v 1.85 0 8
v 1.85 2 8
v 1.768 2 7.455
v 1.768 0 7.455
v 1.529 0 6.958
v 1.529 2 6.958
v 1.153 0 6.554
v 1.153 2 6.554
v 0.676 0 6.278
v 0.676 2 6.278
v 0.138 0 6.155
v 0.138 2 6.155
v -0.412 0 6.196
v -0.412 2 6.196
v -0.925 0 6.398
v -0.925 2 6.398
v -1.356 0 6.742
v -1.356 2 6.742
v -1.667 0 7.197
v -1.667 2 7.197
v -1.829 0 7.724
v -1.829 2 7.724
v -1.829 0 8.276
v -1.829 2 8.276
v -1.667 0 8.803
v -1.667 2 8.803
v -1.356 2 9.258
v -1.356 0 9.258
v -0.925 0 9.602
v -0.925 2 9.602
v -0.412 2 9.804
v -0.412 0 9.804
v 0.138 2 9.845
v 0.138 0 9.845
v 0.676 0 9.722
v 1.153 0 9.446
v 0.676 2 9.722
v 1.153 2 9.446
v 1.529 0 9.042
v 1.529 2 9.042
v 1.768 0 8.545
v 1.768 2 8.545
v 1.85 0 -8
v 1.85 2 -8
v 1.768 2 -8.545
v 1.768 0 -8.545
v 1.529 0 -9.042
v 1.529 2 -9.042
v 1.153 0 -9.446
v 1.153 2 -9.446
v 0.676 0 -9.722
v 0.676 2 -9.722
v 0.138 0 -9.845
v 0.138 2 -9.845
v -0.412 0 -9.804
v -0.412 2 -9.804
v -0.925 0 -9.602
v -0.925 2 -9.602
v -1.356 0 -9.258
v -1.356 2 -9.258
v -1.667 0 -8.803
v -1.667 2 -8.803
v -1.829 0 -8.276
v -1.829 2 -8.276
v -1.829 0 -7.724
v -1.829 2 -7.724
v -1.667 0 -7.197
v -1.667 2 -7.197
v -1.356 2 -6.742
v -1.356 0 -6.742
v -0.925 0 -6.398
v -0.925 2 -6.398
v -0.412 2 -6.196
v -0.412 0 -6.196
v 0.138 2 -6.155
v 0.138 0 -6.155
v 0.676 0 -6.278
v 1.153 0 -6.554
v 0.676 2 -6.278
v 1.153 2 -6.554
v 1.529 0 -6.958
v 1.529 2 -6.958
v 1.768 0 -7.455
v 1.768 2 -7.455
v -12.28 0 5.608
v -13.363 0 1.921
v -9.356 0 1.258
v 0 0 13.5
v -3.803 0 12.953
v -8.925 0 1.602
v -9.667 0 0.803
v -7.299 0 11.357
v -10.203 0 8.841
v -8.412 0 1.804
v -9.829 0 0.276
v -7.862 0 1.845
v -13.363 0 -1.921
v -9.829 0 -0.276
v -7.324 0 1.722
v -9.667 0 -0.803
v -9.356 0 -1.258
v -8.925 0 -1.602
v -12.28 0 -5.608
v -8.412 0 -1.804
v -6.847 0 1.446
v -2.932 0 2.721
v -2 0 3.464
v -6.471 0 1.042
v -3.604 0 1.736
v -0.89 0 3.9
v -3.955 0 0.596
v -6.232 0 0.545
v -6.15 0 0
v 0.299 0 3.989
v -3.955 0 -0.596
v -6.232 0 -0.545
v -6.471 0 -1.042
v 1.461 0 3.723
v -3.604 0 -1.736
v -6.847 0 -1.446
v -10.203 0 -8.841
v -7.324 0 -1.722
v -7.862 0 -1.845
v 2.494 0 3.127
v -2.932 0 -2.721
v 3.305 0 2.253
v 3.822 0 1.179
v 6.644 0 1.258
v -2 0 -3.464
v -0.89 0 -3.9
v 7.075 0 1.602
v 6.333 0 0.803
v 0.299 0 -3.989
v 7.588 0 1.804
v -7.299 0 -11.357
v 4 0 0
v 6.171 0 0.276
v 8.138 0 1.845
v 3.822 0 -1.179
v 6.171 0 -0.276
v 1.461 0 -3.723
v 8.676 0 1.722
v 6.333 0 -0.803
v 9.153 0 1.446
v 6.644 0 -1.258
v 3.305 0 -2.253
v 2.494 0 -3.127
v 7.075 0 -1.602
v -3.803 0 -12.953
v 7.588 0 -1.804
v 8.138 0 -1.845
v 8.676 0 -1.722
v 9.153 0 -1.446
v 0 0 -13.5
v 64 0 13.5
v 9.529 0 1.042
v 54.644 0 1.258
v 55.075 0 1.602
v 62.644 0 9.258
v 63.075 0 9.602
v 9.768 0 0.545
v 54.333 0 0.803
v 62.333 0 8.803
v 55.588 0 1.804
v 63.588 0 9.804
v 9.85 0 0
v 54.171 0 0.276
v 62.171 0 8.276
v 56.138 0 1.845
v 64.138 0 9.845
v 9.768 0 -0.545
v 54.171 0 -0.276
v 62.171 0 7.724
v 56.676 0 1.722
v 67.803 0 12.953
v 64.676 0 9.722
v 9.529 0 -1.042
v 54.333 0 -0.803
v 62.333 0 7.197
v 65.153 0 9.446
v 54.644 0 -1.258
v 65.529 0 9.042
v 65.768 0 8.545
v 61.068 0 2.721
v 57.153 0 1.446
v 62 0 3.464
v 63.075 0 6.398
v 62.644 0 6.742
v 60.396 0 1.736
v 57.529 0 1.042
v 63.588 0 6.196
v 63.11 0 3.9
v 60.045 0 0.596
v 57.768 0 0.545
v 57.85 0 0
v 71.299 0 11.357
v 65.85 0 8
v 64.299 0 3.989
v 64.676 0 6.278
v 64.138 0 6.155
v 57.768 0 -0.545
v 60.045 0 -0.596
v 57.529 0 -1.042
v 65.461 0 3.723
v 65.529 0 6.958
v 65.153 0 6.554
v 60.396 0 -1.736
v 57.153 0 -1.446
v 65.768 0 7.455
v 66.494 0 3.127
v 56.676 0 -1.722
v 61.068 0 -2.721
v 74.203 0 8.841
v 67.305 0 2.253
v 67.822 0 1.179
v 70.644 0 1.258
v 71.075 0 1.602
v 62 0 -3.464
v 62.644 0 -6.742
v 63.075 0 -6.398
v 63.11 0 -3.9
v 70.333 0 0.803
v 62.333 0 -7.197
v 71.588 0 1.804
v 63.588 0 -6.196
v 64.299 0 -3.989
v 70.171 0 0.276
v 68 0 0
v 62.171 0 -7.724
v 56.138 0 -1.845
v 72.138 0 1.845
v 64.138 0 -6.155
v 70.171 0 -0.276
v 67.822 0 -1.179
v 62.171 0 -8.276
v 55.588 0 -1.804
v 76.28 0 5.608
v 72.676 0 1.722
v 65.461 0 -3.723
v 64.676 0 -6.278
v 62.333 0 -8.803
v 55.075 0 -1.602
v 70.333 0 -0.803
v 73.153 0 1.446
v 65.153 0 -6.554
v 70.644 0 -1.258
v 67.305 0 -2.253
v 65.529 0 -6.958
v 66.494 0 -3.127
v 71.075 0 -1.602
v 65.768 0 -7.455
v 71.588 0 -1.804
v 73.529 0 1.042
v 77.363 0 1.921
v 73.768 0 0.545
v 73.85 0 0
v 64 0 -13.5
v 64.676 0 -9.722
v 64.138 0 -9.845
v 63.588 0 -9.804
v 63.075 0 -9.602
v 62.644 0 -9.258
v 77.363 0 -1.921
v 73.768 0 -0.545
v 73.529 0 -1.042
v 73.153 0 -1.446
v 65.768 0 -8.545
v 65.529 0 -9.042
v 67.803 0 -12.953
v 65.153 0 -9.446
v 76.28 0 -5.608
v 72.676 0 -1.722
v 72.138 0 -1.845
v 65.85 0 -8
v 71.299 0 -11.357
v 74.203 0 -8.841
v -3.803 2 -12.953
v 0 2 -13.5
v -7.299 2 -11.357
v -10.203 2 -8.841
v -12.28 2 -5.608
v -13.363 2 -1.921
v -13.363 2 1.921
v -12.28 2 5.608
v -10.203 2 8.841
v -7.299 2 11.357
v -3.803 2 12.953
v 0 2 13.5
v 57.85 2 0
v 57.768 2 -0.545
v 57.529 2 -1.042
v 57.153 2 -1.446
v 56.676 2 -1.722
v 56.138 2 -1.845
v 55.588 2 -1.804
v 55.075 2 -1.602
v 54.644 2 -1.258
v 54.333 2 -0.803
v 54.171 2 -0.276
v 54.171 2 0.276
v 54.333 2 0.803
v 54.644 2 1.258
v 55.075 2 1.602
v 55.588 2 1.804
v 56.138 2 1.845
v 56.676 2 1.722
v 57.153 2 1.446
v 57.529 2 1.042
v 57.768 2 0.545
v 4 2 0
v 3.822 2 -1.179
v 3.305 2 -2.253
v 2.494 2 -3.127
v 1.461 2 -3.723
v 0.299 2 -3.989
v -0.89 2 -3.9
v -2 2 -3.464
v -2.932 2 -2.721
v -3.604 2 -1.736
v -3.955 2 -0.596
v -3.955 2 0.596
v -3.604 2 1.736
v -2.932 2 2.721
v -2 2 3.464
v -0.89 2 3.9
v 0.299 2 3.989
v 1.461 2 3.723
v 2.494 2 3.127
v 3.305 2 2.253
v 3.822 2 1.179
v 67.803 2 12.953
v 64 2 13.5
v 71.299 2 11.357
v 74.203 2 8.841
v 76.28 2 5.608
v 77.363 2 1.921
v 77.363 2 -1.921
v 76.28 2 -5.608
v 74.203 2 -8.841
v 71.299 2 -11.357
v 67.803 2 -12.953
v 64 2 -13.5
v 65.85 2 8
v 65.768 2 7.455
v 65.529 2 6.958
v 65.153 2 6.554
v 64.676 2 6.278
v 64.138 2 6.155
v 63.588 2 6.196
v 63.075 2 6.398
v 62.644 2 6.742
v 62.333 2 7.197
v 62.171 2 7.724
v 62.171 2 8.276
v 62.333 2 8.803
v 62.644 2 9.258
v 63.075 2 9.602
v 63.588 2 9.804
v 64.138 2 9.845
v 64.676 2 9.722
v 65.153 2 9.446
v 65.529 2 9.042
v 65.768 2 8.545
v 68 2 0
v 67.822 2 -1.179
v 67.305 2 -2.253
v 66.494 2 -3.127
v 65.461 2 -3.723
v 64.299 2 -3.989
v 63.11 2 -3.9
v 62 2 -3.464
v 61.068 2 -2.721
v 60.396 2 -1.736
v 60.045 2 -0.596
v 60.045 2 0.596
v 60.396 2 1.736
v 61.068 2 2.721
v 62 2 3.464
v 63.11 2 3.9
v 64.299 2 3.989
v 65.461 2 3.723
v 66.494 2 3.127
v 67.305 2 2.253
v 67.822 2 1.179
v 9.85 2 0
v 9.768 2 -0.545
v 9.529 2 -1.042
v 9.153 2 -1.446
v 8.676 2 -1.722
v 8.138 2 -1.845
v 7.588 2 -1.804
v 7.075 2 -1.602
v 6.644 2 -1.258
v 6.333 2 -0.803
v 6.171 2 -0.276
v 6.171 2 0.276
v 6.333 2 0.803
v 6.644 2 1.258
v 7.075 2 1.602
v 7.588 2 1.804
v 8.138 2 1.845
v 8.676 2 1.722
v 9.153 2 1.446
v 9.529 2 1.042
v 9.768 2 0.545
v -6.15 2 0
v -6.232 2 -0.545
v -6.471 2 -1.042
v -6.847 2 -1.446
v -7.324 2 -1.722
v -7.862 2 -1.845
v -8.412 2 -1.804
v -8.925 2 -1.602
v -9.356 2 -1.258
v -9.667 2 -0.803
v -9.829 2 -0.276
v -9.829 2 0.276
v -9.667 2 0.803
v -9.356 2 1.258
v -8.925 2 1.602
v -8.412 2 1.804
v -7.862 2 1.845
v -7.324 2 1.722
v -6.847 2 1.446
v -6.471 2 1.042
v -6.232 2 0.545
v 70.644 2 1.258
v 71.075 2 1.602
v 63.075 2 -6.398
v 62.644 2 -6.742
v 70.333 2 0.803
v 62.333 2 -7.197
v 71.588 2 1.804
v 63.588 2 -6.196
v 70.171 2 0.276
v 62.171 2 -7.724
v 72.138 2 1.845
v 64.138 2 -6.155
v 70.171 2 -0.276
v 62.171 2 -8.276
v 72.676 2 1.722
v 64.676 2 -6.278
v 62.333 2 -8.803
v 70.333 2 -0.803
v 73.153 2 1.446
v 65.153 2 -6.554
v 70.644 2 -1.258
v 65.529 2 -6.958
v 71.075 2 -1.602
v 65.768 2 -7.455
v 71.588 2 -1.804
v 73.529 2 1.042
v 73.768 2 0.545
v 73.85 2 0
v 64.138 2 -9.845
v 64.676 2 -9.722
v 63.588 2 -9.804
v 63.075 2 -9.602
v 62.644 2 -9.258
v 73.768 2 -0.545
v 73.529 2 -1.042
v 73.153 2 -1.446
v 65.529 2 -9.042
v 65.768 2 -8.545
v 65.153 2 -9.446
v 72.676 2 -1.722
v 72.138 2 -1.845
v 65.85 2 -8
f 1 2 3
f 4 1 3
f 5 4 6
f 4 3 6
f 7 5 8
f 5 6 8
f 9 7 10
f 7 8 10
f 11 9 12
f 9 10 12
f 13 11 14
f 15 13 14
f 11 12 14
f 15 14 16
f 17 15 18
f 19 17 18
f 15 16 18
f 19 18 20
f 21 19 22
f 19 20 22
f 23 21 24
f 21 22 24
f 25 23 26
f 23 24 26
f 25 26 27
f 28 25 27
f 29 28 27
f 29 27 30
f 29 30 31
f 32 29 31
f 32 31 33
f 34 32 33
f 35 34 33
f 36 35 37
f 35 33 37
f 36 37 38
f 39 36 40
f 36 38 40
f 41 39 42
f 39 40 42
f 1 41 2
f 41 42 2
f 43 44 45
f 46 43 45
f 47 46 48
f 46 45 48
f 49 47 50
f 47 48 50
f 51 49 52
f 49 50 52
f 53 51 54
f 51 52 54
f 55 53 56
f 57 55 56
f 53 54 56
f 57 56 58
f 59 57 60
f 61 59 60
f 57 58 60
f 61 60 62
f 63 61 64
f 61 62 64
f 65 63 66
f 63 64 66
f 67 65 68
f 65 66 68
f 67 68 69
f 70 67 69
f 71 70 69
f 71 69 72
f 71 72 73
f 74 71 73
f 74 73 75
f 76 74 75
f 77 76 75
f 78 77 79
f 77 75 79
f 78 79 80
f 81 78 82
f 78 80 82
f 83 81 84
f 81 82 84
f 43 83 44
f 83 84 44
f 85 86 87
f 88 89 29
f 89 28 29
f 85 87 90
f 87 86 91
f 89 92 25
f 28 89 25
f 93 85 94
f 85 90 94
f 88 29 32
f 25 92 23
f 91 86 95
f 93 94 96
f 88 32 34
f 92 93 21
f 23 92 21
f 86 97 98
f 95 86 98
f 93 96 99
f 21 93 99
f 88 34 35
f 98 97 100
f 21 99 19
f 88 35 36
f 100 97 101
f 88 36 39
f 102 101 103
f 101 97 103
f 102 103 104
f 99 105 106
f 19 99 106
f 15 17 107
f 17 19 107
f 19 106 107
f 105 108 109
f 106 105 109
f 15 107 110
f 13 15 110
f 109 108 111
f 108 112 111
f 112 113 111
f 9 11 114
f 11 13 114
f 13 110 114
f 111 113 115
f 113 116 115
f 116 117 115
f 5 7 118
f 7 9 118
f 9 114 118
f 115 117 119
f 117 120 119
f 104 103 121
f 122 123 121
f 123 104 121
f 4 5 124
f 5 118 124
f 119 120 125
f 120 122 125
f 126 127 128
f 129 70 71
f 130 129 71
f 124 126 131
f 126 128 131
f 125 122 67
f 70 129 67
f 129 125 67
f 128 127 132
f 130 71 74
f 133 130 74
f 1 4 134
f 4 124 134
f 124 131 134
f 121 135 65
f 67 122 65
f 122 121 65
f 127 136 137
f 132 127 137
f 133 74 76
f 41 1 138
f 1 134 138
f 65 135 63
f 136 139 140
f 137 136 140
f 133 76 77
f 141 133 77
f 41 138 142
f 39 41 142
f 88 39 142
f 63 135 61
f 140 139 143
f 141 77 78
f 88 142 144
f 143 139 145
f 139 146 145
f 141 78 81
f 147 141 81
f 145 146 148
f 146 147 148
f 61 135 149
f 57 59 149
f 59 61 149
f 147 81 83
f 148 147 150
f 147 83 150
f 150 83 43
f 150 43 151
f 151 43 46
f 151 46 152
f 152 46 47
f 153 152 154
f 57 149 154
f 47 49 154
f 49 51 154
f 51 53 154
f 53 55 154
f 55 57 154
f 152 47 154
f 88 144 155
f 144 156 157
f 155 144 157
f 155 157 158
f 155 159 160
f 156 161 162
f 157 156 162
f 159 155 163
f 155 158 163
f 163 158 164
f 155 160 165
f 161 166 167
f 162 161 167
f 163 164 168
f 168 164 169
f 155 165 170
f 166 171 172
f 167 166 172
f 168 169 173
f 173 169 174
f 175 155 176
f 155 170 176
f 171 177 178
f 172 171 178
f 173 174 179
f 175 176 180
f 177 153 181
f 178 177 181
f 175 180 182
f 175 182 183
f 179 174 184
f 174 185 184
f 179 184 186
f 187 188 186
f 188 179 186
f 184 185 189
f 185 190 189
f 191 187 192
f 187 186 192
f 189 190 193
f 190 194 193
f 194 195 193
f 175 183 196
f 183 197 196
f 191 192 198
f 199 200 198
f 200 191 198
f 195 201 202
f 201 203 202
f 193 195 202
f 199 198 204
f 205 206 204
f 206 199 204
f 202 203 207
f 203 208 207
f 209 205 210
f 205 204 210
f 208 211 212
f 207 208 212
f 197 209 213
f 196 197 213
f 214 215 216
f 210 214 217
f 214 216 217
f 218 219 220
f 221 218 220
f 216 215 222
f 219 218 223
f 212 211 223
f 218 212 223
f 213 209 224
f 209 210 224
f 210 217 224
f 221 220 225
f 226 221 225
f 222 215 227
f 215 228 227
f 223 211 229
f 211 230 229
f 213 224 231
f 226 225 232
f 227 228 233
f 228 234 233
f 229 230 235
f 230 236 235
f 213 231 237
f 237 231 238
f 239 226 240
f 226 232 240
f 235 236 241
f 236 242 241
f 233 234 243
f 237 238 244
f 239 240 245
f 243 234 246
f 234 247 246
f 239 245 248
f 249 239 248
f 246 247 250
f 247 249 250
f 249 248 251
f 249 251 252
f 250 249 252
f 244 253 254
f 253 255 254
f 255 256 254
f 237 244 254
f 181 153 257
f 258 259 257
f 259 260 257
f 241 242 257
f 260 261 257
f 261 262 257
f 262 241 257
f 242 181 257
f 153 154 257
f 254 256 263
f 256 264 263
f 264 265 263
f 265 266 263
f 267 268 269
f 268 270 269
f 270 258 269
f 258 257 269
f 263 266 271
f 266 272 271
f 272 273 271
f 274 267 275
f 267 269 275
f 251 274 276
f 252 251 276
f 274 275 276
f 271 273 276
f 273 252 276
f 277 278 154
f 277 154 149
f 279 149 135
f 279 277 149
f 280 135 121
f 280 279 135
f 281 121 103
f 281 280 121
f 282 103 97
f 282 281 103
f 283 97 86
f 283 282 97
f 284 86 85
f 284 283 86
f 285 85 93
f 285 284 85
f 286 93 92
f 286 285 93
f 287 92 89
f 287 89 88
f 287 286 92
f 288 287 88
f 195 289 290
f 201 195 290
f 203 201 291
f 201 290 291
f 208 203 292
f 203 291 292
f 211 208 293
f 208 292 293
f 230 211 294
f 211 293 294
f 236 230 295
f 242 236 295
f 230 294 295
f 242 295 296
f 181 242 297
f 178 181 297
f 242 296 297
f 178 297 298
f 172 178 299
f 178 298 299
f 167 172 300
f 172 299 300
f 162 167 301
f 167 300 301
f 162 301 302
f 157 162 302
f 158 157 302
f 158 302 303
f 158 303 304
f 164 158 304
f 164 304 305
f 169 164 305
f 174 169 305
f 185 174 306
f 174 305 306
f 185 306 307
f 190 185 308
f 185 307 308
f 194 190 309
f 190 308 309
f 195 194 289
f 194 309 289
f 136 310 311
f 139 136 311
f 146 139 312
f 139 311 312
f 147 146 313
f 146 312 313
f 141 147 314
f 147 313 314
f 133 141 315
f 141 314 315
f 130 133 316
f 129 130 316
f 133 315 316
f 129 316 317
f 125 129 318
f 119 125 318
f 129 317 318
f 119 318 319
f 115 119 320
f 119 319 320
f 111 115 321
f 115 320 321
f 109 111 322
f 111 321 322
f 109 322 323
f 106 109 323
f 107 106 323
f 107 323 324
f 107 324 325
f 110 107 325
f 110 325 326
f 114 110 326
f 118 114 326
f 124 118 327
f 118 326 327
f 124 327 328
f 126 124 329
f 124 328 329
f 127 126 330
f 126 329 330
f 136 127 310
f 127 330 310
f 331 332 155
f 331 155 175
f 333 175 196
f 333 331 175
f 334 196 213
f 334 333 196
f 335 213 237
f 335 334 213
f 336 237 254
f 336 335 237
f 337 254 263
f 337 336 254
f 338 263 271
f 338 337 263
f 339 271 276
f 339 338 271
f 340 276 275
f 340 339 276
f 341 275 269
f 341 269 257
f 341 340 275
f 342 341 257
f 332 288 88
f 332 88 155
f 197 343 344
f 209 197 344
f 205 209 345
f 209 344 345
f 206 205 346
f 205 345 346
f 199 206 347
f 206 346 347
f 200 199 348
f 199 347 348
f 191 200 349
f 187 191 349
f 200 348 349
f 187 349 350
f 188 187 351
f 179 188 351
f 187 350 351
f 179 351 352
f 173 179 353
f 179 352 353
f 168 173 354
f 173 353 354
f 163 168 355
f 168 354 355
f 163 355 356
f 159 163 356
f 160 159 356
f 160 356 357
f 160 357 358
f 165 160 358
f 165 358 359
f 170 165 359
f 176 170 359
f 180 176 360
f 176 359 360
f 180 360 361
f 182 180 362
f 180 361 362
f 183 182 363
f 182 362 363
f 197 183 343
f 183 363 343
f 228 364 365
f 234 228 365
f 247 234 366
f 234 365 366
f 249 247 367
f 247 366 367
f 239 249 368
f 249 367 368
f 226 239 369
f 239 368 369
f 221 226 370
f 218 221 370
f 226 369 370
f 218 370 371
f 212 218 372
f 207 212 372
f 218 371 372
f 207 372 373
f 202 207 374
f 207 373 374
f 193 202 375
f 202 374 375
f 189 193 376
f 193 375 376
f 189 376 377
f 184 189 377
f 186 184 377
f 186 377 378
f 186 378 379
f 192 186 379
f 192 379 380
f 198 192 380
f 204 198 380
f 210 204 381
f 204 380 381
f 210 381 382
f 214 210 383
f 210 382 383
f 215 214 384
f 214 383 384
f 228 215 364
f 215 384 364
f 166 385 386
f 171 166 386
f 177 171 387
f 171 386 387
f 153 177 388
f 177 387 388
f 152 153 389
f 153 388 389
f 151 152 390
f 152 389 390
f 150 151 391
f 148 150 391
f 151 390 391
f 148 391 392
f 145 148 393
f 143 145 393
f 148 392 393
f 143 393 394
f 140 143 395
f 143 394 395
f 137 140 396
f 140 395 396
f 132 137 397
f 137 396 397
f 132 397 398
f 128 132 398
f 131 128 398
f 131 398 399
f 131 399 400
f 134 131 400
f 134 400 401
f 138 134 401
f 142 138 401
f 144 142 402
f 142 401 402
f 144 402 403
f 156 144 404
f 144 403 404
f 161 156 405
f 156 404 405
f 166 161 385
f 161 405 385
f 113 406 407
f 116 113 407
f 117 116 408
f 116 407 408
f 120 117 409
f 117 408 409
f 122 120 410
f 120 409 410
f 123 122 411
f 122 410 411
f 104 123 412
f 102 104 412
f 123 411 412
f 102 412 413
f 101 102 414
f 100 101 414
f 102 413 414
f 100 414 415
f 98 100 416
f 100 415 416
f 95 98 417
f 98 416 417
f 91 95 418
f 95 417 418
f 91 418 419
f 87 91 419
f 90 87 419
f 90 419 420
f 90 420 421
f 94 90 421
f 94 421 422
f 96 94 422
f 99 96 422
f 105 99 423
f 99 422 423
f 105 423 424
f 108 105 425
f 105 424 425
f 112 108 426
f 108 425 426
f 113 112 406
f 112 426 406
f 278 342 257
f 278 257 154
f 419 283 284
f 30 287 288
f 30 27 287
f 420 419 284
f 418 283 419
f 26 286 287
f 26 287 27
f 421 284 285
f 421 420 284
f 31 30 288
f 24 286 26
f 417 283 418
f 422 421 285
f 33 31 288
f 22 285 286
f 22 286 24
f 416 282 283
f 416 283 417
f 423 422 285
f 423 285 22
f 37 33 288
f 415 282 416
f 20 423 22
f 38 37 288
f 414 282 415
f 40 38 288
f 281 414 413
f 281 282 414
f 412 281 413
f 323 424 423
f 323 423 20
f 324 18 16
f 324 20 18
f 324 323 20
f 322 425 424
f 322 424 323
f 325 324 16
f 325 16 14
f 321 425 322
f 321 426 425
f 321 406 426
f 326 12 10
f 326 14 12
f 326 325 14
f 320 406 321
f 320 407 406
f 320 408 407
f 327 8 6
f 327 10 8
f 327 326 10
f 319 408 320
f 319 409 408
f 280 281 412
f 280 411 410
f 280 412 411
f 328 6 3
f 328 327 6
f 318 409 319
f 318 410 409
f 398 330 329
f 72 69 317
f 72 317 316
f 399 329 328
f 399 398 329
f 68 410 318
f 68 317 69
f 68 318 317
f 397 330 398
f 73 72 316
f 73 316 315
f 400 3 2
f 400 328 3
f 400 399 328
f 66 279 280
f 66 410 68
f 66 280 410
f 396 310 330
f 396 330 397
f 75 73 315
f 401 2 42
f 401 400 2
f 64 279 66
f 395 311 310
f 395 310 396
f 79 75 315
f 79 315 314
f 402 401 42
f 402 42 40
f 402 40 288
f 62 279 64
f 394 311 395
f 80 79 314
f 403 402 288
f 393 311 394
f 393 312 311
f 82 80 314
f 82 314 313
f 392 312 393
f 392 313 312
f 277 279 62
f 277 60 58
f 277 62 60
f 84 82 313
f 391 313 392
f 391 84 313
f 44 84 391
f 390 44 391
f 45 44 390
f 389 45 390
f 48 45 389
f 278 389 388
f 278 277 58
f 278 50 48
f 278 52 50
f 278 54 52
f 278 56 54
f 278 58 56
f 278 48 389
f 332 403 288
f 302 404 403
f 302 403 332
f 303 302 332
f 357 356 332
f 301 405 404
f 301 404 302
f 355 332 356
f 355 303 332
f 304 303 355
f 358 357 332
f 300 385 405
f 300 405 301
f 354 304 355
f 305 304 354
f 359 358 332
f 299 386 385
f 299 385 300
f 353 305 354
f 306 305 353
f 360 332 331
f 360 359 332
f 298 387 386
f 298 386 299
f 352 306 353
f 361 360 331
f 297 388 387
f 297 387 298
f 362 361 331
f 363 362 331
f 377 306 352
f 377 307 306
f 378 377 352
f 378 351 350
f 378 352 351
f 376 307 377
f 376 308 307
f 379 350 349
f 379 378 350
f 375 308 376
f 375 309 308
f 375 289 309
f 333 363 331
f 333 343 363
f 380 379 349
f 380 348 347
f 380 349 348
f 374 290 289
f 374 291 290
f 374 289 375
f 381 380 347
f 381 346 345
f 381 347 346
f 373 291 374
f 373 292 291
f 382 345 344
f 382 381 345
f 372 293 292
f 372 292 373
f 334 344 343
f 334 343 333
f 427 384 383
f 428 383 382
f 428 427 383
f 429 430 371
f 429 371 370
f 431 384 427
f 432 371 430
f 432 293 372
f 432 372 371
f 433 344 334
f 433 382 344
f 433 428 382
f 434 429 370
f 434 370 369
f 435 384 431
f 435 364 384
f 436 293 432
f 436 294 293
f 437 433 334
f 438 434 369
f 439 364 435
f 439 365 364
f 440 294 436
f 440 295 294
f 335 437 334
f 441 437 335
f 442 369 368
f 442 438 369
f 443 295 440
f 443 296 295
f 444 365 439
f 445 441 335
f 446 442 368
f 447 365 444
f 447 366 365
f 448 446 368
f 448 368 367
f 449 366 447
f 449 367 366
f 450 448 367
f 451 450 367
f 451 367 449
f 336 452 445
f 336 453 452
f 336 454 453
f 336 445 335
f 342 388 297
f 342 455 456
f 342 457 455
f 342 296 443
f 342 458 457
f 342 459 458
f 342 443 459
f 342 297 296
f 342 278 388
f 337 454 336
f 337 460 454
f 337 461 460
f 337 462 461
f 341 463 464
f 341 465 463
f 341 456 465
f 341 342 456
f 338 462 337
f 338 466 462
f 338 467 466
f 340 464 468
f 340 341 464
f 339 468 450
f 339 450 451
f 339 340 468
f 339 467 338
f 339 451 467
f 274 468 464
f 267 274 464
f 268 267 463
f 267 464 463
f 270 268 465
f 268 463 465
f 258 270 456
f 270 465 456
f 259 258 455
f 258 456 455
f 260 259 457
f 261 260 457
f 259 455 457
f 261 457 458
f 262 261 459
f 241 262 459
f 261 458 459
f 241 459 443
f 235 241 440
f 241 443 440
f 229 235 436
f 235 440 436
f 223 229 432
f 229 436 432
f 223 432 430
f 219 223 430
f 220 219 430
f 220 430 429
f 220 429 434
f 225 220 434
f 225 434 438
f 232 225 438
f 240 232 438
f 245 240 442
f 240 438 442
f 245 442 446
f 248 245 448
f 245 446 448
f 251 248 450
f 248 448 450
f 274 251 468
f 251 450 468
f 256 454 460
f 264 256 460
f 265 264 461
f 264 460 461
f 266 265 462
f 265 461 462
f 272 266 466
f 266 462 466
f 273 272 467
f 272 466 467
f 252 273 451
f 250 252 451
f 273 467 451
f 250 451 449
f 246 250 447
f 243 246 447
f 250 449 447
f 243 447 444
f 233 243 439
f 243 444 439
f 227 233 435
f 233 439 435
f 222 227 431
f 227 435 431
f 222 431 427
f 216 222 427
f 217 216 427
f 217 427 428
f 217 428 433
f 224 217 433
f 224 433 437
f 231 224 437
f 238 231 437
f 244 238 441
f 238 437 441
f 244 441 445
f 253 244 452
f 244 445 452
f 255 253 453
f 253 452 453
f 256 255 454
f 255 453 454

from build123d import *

# Parameters (mm, degrees)
SKETCH1_R           = 1.85
SKETCH1_R_2         = 4
BOSS_EXTRUDE1_DEPTH = 2


with BuildPart() as part:
    # Sketch1 → Boss-Extrude1 (new body)
    with BuildSketch(Plane(origin=(0, 2, 0), x_dir=(1, 0, 0), z_dir=(0, 1, 0))):
        with BuildLine():
            Line((64, 13.5), (0, 13.5))
            ThreePointArc((0, 13.5), (-13.5, 0), (0, -13.5))
            Line((0, -13.5), (64, -13.5))
            ThreePointArc((64, -13.5), (77.5, 0), (64, 13.5))
        make_face()
        with Locations((56, 0)):
            Circle(SKETCH1_R, mode=Mode.SUBTRACT)
        with Locations((64, -8)):
            Circle(SKETCH1_R, mode=Mode.SUBTRACT)
        with Locations((72, 0)):
            Circle(SKETCH1_R, mode=Mode.SUBTRACT)
        with Locations((64, 8)):
            Circle(SKETCH1_R, mode=Mode.SUBTRACT)
        with Locations((64, 0)):
            Circle(SKETCH1_R_2, mode=Mode.SUBTRACT)
        with Locations((-8, 0)):
            Circle(SKETCH1_R, mode=Mode.SUBTRACT)
        with Locations((0, -8)):
            Circle(SKETCH1_R, mode=Mode.SUBTRACT)
        with Locations((8, 0)):
            Circle(SKETCH1_R, mode=Mode.SUBTRACT)
        with Locations((0, 8)):
            Circle(SKETCH1_R, mode=Mode.SUBTRACT)
        Circle(SKETCH1_R_2, mode=Mode.SUBTRACT)
    extrude(amount=-BOSS_EXTRUDE1_DEPTH)


solid = part.part
